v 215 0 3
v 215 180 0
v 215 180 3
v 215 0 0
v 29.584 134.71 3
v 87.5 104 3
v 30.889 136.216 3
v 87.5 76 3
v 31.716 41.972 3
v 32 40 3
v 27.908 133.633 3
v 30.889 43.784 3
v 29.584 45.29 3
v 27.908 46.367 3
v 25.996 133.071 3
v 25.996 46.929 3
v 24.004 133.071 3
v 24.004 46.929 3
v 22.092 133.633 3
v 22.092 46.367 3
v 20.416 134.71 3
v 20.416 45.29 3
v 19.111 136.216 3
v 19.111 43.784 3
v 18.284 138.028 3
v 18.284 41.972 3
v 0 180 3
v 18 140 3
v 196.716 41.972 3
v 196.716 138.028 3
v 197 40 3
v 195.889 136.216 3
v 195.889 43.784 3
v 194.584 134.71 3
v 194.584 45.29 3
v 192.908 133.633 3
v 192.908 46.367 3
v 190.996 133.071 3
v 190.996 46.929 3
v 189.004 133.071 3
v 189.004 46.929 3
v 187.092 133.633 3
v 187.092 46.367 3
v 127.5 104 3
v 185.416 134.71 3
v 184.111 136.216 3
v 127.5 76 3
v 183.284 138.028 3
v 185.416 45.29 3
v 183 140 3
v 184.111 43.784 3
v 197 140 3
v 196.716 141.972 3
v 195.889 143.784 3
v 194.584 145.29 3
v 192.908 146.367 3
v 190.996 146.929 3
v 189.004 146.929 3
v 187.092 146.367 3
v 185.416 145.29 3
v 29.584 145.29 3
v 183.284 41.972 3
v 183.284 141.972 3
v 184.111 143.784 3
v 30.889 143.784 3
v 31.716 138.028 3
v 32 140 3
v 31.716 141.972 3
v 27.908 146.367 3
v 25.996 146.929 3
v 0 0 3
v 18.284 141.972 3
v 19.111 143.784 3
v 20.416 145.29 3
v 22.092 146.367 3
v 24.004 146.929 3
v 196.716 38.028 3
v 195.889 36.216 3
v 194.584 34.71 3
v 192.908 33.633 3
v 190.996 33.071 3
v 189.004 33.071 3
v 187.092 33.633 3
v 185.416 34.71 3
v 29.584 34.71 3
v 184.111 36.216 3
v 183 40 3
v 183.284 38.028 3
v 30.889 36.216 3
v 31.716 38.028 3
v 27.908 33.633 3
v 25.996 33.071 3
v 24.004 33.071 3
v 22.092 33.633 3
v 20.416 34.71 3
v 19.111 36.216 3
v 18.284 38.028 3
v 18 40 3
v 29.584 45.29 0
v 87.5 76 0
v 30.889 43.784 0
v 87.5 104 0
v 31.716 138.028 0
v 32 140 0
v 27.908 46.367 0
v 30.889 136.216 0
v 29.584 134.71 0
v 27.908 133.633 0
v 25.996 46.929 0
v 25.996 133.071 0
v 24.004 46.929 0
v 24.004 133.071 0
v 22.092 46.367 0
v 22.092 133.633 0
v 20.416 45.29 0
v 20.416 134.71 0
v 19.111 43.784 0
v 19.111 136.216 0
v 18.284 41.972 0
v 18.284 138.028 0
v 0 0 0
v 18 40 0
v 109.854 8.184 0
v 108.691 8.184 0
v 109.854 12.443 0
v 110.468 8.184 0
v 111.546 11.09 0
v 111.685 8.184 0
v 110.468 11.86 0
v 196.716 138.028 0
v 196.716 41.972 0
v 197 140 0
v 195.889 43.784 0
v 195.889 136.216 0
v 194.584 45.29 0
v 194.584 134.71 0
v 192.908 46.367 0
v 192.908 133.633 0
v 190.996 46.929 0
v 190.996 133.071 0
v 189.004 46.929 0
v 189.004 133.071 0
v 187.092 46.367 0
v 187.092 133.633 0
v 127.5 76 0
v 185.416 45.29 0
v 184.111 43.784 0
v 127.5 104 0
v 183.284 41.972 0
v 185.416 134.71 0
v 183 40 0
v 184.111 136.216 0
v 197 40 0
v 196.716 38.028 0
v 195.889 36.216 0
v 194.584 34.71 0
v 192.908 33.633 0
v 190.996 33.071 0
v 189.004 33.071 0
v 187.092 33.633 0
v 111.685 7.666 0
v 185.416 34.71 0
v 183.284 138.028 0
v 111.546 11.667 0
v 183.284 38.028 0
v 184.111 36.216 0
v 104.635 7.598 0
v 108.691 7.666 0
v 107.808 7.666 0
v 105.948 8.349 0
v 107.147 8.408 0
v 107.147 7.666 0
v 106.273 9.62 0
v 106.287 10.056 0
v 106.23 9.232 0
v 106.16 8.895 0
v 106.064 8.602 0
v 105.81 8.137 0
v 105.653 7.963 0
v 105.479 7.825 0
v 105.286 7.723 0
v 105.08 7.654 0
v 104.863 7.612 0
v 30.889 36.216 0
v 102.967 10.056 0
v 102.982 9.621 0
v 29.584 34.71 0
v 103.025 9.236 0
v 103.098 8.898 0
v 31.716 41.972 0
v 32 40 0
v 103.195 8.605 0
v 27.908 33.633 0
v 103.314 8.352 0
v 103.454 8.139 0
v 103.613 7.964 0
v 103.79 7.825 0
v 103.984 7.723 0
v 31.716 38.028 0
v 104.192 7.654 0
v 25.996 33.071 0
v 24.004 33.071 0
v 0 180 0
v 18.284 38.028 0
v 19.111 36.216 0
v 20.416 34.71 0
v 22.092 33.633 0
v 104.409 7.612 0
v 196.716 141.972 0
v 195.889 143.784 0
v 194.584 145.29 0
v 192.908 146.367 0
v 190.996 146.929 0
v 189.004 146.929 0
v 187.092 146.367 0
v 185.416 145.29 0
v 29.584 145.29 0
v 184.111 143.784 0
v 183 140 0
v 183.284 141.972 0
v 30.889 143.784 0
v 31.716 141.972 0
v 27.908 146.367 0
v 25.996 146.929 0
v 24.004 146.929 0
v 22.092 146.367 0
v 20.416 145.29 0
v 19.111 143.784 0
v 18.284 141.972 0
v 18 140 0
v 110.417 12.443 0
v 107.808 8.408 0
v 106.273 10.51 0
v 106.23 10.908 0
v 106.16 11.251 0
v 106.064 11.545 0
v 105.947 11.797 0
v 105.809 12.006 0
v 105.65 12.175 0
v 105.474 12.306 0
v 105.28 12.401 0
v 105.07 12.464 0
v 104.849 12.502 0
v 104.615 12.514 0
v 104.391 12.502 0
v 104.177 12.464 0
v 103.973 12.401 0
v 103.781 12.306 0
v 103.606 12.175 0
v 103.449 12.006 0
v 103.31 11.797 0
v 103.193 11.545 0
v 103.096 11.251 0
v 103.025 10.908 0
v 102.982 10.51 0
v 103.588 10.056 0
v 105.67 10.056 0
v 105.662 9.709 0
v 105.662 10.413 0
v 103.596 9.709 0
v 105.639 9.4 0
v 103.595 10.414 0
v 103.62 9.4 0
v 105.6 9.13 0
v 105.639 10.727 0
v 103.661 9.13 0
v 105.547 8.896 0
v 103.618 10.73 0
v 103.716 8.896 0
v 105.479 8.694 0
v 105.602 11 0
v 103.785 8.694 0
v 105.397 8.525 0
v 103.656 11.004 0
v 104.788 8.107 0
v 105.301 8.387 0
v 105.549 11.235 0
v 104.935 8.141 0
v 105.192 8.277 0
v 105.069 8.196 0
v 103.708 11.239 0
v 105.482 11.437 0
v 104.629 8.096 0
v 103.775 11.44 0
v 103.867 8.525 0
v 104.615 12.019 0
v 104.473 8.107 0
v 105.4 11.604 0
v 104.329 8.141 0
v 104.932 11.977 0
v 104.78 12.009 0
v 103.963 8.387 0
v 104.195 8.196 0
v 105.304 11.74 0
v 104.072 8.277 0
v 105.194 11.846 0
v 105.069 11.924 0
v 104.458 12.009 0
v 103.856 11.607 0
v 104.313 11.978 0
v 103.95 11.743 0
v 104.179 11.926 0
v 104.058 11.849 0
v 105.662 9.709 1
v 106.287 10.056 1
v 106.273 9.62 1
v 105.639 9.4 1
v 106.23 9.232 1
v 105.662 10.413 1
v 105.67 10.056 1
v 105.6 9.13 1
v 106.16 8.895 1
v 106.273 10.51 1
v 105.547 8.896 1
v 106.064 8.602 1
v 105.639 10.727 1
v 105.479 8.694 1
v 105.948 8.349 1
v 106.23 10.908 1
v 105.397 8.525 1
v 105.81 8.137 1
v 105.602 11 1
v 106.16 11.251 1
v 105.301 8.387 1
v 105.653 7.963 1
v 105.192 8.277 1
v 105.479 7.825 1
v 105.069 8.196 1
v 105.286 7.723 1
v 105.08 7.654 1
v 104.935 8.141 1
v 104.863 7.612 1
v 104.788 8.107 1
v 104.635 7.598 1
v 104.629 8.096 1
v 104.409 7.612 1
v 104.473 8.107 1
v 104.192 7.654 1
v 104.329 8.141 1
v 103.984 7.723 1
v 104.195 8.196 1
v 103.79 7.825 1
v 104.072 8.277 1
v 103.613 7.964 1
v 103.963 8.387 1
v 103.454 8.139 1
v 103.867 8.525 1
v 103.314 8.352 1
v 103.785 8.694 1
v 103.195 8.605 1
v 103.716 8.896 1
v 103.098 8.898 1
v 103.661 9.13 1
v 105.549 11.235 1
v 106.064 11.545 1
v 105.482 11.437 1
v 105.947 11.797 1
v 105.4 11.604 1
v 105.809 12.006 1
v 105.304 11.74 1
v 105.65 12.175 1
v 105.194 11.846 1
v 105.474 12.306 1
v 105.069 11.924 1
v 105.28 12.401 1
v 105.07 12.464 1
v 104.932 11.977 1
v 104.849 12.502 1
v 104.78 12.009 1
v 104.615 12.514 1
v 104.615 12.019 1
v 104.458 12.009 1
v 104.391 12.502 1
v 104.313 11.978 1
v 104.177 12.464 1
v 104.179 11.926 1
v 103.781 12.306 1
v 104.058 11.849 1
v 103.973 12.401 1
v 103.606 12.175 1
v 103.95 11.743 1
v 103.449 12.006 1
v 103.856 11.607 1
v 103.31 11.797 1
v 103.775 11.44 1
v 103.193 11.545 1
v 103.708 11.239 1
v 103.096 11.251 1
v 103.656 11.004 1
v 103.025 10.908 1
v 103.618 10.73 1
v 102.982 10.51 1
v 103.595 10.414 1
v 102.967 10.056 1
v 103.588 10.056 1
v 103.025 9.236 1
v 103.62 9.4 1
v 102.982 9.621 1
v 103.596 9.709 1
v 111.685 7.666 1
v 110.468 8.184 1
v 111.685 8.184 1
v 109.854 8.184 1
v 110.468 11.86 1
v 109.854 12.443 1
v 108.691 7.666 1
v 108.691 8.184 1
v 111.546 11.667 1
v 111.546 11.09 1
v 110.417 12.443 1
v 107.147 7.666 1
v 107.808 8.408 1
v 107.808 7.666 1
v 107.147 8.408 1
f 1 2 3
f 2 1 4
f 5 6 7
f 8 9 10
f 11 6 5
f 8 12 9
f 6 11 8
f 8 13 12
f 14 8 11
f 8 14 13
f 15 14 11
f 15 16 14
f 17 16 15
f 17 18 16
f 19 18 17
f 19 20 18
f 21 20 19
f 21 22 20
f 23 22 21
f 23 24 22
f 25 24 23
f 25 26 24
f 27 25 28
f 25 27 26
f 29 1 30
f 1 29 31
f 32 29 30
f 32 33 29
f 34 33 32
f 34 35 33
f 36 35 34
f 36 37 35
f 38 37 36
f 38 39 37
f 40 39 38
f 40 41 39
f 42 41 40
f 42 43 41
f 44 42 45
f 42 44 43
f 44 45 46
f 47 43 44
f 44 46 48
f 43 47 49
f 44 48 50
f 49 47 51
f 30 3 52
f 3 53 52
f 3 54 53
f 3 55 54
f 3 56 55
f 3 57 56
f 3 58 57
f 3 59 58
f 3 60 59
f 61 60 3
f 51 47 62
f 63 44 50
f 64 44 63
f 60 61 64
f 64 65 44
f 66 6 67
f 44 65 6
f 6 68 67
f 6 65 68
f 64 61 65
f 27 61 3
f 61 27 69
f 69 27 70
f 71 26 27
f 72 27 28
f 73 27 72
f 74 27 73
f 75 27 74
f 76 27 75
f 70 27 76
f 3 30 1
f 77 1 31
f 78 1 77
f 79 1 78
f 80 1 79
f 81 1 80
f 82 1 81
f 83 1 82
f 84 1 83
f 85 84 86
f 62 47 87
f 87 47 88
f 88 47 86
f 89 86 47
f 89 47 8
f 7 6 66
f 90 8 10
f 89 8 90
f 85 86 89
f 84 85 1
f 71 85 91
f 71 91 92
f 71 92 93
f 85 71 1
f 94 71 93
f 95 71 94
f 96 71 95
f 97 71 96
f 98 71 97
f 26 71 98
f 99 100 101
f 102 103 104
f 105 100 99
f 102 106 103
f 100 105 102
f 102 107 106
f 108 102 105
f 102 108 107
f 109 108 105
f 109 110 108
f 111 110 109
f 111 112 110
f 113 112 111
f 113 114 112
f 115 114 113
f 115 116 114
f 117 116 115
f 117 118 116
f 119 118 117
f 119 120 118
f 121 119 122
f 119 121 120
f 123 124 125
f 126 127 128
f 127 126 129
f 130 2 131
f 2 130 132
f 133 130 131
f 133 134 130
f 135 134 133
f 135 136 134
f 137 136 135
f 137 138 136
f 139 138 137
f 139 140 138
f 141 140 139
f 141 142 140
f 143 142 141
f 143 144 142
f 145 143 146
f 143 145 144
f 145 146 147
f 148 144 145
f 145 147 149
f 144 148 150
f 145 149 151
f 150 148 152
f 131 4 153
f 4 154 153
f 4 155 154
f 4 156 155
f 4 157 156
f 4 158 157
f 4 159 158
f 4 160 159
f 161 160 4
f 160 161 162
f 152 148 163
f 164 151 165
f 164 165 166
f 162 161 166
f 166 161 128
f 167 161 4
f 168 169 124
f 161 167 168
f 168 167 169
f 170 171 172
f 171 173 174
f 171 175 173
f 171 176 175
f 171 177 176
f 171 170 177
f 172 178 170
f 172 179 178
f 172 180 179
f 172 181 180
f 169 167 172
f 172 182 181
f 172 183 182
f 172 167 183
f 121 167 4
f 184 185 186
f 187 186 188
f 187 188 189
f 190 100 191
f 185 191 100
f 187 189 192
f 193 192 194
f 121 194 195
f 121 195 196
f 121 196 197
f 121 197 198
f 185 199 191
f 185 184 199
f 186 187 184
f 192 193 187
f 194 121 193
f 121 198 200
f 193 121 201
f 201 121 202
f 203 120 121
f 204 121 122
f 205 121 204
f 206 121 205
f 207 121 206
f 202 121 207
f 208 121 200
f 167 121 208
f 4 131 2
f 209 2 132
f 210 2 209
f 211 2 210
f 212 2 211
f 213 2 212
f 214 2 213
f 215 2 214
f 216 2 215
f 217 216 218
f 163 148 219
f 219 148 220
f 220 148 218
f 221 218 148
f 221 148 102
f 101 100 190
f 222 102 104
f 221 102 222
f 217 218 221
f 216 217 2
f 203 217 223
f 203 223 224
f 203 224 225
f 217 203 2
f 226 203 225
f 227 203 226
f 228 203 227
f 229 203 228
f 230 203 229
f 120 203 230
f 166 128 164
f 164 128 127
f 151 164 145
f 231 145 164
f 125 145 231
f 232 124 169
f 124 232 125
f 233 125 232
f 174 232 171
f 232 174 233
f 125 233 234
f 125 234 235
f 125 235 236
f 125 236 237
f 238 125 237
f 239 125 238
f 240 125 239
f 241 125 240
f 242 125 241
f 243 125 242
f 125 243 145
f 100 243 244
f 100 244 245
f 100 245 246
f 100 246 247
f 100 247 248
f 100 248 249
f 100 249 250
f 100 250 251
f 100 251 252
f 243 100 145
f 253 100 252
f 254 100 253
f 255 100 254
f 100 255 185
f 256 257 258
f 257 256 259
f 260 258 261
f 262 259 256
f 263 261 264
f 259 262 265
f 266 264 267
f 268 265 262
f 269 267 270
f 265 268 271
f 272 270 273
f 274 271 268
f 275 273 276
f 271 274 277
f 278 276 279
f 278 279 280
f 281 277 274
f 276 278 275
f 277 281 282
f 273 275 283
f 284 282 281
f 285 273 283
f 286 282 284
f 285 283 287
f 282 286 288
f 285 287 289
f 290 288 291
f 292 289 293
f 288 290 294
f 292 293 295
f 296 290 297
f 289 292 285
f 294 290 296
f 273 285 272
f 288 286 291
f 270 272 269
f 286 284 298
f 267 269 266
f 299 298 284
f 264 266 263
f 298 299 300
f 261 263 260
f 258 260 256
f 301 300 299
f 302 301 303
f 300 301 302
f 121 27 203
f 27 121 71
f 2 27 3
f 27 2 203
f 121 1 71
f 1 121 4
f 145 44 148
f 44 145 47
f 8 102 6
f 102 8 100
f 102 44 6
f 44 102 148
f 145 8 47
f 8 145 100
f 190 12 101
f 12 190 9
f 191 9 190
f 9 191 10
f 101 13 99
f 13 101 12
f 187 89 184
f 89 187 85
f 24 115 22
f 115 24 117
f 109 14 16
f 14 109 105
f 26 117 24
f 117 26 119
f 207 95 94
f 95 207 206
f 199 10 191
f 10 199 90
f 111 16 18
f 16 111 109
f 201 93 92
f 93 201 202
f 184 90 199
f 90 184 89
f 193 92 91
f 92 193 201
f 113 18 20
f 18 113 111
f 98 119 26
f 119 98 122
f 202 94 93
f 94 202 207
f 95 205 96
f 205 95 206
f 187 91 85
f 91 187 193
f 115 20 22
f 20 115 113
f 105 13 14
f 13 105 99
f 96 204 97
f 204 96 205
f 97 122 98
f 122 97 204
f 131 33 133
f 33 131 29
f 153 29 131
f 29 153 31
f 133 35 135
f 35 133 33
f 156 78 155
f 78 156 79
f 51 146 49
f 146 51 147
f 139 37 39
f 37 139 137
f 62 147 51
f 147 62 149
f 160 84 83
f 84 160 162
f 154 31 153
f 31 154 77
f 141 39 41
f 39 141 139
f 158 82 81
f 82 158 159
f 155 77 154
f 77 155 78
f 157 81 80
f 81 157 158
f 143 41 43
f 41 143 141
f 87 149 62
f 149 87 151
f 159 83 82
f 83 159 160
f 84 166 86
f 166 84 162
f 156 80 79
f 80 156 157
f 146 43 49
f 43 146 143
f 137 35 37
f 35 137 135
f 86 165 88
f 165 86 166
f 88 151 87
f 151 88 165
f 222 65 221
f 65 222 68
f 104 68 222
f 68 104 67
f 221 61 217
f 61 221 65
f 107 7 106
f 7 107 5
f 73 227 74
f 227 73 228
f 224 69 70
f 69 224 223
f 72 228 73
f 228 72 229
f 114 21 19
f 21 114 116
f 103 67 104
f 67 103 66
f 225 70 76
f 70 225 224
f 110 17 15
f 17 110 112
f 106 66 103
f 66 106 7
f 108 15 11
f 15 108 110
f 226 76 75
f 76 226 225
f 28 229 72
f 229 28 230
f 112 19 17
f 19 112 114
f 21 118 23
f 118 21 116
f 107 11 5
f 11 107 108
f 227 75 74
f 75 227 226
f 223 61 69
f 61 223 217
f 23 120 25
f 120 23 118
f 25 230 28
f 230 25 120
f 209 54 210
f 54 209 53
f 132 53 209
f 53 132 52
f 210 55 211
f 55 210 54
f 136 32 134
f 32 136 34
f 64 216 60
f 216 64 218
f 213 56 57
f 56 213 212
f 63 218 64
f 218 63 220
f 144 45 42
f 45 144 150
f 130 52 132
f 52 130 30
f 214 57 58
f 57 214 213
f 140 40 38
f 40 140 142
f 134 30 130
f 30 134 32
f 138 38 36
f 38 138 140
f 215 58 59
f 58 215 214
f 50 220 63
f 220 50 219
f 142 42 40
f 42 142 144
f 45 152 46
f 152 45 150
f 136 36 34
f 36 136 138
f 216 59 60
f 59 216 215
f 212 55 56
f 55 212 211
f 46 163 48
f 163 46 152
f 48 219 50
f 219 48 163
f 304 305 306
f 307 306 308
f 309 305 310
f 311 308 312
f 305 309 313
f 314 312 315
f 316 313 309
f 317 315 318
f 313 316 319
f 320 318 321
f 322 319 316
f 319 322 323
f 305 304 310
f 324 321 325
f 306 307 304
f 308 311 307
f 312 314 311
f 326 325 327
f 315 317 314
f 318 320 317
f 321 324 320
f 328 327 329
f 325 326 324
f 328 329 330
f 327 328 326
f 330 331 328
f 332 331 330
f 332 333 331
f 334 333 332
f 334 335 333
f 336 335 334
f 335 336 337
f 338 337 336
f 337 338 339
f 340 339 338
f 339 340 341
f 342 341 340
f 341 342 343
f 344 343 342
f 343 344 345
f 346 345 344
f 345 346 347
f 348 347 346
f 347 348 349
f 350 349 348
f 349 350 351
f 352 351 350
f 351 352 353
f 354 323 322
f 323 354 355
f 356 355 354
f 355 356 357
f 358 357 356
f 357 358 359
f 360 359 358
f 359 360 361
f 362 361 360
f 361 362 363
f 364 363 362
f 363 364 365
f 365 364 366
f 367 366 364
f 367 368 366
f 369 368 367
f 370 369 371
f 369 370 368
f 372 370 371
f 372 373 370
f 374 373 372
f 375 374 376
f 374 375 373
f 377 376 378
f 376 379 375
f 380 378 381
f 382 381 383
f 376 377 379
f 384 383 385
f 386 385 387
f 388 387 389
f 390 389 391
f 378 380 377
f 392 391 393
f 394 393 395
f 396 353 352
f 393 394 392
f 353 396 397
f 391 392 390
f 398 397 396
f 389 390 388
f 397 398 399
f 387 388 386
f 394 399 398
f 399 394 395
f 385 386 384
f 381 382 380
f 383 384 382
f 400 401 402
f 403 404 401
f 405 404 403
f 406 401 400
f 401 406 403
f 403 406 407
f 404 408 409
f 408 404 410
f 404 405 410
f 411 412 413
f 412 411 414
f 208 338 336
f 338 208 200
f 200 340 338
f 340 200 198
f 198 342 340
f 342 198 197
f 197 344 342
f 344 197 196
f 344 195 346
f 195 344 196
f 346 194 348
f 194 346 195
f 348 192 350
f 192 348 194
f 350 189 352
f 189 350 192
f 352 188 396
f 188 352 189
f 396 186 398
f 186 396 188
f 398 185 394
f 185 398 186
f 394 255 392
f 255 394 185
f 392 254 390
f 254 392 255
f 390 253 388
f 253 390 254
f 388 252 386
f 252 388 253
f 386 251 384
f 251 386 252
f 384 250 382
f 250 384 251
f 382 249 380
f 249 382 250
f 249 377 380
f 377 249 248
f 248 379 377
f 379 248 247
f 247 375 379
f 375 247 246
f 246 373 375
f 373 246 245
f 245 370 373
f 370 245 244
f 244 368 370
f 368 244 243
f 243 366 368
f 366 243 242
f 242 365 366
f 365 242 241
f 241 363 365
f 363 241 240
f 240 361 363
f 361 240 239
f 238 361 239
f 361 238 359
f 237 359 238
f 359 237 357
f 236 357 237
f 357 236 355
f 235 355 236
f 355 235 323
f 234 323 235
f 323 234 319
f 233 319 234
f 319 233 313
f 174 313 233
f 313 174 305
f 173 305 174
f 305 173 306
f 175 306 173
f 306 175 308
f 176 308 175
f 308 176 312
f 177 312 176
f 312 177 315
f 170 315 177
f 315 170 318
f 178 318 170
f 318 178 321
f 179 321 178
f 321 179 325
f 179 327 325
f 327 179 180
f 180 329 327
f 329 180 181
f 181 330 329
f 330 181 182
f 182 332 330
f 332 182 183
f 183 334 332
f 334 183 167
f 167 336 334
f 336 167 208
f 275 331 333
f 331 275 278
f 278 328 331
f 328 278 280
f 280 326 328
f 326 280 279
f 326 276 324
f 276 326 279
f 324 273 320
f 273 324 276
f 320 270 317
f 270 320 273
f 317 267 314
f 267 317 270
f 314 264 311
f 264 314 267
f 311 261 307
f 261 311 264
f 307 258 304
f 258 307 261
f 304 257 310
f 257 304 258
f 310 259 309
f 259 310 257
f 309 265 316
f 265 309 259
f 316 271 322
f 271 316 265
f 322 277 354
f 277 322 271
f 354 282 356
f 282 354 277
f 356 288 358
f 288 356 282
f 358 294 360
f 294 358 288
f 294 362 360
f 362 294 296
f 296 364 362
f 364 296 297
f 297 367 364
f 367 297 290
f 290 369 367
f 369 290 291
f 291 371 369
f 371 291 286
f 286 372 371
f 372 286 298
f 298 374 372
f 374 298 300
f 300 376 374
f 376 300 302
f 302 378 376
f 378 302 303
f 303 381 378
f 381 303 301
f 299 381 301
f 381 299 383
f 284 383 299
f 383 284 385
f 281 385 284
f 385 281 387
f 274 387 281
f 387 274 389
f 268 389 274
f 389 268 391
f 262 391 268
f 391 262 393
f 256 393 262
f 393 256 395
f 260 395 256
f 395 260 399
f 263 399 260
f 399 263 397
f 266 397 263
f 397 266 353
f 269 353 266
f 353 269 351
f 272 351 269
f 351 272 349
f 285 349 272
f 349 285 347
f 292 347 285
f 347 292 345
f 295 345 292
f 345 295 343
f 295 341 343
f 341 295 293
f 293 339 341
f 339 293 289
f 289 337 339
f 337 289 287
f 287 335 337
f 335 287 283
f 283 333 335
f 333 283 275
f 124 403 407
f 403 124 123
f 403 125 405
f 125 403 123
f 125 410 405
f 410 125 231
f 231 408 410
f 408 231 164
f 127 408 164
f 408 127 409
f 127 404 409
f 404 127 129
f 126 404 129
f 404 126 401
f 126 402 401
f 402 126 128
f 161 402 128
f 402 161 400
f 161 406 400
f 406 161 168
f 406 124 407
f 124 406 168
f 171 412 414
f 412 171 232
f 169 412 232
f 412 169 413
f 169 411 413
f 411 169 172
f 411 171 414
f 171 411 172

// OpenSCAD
//scanner plate base

ver="1.0";

dist_btw_hole_centers_horiz = 165;
dist_btw_hole_centers_vert = 100;
hole_center_to_edge_horiz = 25;
hole_center_to_edge_vert = 40;
thumbwheel_diameter = 20;
hole_diameter = 14;
expected_holder_height = 45;
//width/height of film window
fw = 40;
fh = 28;

//height of scanner base
z=3;

//gap
g=0.001;

w = dist_btw_hole_centers_horiz + 2 * hole_center_to_edge_horiz;
h = dist_btw_hole_centers_vert + 2 * hole_center_to_edge_vert;

assert(expected_holder_height < dist_btw_hole_centers_vert - thumbwheel_diameter, 
    "Film holder won't pass between thumbwheels");
assert(fh < dist_btw_hole_centers_vert - thumbwheel_diameter,
    "Film won't pass between thumbwheels");
assert(thumbwheel_diameter > hole_diameter, "Thumbwheel won't clamp the plate");

echo(str("width=", w, ", height=", h));

module hole() {
    cylinder(h=z+g, r1=hole_diameter/2,
        r2=hole_diameter/2, center=false);
}

translate([0,0,0]) difference() {
    cube([w,h,z]);
    translate([w/2,h/2,z/2]) cube([fw,fh,z+g], center=true);
    translate([hole_center_to_edge_horiz, hole_center_to_edge_vert]) hole();
    translate([w - hole_center_to_edge_horiz, hole_center_to_edge_vert]) hole();
    translate([hole_center_to_edge_horiz, h - hole_center_to_edge_vert]) hole();
    translate([w - hole_center_to_edge_horiz, h - hole_center_to_edge_vert]) hole();
    translate([w/2,10,0]) mirror([1,0,0]) linear_extrude(z/3)
        text(ver, valign="center", halign="center", size=5);
};
